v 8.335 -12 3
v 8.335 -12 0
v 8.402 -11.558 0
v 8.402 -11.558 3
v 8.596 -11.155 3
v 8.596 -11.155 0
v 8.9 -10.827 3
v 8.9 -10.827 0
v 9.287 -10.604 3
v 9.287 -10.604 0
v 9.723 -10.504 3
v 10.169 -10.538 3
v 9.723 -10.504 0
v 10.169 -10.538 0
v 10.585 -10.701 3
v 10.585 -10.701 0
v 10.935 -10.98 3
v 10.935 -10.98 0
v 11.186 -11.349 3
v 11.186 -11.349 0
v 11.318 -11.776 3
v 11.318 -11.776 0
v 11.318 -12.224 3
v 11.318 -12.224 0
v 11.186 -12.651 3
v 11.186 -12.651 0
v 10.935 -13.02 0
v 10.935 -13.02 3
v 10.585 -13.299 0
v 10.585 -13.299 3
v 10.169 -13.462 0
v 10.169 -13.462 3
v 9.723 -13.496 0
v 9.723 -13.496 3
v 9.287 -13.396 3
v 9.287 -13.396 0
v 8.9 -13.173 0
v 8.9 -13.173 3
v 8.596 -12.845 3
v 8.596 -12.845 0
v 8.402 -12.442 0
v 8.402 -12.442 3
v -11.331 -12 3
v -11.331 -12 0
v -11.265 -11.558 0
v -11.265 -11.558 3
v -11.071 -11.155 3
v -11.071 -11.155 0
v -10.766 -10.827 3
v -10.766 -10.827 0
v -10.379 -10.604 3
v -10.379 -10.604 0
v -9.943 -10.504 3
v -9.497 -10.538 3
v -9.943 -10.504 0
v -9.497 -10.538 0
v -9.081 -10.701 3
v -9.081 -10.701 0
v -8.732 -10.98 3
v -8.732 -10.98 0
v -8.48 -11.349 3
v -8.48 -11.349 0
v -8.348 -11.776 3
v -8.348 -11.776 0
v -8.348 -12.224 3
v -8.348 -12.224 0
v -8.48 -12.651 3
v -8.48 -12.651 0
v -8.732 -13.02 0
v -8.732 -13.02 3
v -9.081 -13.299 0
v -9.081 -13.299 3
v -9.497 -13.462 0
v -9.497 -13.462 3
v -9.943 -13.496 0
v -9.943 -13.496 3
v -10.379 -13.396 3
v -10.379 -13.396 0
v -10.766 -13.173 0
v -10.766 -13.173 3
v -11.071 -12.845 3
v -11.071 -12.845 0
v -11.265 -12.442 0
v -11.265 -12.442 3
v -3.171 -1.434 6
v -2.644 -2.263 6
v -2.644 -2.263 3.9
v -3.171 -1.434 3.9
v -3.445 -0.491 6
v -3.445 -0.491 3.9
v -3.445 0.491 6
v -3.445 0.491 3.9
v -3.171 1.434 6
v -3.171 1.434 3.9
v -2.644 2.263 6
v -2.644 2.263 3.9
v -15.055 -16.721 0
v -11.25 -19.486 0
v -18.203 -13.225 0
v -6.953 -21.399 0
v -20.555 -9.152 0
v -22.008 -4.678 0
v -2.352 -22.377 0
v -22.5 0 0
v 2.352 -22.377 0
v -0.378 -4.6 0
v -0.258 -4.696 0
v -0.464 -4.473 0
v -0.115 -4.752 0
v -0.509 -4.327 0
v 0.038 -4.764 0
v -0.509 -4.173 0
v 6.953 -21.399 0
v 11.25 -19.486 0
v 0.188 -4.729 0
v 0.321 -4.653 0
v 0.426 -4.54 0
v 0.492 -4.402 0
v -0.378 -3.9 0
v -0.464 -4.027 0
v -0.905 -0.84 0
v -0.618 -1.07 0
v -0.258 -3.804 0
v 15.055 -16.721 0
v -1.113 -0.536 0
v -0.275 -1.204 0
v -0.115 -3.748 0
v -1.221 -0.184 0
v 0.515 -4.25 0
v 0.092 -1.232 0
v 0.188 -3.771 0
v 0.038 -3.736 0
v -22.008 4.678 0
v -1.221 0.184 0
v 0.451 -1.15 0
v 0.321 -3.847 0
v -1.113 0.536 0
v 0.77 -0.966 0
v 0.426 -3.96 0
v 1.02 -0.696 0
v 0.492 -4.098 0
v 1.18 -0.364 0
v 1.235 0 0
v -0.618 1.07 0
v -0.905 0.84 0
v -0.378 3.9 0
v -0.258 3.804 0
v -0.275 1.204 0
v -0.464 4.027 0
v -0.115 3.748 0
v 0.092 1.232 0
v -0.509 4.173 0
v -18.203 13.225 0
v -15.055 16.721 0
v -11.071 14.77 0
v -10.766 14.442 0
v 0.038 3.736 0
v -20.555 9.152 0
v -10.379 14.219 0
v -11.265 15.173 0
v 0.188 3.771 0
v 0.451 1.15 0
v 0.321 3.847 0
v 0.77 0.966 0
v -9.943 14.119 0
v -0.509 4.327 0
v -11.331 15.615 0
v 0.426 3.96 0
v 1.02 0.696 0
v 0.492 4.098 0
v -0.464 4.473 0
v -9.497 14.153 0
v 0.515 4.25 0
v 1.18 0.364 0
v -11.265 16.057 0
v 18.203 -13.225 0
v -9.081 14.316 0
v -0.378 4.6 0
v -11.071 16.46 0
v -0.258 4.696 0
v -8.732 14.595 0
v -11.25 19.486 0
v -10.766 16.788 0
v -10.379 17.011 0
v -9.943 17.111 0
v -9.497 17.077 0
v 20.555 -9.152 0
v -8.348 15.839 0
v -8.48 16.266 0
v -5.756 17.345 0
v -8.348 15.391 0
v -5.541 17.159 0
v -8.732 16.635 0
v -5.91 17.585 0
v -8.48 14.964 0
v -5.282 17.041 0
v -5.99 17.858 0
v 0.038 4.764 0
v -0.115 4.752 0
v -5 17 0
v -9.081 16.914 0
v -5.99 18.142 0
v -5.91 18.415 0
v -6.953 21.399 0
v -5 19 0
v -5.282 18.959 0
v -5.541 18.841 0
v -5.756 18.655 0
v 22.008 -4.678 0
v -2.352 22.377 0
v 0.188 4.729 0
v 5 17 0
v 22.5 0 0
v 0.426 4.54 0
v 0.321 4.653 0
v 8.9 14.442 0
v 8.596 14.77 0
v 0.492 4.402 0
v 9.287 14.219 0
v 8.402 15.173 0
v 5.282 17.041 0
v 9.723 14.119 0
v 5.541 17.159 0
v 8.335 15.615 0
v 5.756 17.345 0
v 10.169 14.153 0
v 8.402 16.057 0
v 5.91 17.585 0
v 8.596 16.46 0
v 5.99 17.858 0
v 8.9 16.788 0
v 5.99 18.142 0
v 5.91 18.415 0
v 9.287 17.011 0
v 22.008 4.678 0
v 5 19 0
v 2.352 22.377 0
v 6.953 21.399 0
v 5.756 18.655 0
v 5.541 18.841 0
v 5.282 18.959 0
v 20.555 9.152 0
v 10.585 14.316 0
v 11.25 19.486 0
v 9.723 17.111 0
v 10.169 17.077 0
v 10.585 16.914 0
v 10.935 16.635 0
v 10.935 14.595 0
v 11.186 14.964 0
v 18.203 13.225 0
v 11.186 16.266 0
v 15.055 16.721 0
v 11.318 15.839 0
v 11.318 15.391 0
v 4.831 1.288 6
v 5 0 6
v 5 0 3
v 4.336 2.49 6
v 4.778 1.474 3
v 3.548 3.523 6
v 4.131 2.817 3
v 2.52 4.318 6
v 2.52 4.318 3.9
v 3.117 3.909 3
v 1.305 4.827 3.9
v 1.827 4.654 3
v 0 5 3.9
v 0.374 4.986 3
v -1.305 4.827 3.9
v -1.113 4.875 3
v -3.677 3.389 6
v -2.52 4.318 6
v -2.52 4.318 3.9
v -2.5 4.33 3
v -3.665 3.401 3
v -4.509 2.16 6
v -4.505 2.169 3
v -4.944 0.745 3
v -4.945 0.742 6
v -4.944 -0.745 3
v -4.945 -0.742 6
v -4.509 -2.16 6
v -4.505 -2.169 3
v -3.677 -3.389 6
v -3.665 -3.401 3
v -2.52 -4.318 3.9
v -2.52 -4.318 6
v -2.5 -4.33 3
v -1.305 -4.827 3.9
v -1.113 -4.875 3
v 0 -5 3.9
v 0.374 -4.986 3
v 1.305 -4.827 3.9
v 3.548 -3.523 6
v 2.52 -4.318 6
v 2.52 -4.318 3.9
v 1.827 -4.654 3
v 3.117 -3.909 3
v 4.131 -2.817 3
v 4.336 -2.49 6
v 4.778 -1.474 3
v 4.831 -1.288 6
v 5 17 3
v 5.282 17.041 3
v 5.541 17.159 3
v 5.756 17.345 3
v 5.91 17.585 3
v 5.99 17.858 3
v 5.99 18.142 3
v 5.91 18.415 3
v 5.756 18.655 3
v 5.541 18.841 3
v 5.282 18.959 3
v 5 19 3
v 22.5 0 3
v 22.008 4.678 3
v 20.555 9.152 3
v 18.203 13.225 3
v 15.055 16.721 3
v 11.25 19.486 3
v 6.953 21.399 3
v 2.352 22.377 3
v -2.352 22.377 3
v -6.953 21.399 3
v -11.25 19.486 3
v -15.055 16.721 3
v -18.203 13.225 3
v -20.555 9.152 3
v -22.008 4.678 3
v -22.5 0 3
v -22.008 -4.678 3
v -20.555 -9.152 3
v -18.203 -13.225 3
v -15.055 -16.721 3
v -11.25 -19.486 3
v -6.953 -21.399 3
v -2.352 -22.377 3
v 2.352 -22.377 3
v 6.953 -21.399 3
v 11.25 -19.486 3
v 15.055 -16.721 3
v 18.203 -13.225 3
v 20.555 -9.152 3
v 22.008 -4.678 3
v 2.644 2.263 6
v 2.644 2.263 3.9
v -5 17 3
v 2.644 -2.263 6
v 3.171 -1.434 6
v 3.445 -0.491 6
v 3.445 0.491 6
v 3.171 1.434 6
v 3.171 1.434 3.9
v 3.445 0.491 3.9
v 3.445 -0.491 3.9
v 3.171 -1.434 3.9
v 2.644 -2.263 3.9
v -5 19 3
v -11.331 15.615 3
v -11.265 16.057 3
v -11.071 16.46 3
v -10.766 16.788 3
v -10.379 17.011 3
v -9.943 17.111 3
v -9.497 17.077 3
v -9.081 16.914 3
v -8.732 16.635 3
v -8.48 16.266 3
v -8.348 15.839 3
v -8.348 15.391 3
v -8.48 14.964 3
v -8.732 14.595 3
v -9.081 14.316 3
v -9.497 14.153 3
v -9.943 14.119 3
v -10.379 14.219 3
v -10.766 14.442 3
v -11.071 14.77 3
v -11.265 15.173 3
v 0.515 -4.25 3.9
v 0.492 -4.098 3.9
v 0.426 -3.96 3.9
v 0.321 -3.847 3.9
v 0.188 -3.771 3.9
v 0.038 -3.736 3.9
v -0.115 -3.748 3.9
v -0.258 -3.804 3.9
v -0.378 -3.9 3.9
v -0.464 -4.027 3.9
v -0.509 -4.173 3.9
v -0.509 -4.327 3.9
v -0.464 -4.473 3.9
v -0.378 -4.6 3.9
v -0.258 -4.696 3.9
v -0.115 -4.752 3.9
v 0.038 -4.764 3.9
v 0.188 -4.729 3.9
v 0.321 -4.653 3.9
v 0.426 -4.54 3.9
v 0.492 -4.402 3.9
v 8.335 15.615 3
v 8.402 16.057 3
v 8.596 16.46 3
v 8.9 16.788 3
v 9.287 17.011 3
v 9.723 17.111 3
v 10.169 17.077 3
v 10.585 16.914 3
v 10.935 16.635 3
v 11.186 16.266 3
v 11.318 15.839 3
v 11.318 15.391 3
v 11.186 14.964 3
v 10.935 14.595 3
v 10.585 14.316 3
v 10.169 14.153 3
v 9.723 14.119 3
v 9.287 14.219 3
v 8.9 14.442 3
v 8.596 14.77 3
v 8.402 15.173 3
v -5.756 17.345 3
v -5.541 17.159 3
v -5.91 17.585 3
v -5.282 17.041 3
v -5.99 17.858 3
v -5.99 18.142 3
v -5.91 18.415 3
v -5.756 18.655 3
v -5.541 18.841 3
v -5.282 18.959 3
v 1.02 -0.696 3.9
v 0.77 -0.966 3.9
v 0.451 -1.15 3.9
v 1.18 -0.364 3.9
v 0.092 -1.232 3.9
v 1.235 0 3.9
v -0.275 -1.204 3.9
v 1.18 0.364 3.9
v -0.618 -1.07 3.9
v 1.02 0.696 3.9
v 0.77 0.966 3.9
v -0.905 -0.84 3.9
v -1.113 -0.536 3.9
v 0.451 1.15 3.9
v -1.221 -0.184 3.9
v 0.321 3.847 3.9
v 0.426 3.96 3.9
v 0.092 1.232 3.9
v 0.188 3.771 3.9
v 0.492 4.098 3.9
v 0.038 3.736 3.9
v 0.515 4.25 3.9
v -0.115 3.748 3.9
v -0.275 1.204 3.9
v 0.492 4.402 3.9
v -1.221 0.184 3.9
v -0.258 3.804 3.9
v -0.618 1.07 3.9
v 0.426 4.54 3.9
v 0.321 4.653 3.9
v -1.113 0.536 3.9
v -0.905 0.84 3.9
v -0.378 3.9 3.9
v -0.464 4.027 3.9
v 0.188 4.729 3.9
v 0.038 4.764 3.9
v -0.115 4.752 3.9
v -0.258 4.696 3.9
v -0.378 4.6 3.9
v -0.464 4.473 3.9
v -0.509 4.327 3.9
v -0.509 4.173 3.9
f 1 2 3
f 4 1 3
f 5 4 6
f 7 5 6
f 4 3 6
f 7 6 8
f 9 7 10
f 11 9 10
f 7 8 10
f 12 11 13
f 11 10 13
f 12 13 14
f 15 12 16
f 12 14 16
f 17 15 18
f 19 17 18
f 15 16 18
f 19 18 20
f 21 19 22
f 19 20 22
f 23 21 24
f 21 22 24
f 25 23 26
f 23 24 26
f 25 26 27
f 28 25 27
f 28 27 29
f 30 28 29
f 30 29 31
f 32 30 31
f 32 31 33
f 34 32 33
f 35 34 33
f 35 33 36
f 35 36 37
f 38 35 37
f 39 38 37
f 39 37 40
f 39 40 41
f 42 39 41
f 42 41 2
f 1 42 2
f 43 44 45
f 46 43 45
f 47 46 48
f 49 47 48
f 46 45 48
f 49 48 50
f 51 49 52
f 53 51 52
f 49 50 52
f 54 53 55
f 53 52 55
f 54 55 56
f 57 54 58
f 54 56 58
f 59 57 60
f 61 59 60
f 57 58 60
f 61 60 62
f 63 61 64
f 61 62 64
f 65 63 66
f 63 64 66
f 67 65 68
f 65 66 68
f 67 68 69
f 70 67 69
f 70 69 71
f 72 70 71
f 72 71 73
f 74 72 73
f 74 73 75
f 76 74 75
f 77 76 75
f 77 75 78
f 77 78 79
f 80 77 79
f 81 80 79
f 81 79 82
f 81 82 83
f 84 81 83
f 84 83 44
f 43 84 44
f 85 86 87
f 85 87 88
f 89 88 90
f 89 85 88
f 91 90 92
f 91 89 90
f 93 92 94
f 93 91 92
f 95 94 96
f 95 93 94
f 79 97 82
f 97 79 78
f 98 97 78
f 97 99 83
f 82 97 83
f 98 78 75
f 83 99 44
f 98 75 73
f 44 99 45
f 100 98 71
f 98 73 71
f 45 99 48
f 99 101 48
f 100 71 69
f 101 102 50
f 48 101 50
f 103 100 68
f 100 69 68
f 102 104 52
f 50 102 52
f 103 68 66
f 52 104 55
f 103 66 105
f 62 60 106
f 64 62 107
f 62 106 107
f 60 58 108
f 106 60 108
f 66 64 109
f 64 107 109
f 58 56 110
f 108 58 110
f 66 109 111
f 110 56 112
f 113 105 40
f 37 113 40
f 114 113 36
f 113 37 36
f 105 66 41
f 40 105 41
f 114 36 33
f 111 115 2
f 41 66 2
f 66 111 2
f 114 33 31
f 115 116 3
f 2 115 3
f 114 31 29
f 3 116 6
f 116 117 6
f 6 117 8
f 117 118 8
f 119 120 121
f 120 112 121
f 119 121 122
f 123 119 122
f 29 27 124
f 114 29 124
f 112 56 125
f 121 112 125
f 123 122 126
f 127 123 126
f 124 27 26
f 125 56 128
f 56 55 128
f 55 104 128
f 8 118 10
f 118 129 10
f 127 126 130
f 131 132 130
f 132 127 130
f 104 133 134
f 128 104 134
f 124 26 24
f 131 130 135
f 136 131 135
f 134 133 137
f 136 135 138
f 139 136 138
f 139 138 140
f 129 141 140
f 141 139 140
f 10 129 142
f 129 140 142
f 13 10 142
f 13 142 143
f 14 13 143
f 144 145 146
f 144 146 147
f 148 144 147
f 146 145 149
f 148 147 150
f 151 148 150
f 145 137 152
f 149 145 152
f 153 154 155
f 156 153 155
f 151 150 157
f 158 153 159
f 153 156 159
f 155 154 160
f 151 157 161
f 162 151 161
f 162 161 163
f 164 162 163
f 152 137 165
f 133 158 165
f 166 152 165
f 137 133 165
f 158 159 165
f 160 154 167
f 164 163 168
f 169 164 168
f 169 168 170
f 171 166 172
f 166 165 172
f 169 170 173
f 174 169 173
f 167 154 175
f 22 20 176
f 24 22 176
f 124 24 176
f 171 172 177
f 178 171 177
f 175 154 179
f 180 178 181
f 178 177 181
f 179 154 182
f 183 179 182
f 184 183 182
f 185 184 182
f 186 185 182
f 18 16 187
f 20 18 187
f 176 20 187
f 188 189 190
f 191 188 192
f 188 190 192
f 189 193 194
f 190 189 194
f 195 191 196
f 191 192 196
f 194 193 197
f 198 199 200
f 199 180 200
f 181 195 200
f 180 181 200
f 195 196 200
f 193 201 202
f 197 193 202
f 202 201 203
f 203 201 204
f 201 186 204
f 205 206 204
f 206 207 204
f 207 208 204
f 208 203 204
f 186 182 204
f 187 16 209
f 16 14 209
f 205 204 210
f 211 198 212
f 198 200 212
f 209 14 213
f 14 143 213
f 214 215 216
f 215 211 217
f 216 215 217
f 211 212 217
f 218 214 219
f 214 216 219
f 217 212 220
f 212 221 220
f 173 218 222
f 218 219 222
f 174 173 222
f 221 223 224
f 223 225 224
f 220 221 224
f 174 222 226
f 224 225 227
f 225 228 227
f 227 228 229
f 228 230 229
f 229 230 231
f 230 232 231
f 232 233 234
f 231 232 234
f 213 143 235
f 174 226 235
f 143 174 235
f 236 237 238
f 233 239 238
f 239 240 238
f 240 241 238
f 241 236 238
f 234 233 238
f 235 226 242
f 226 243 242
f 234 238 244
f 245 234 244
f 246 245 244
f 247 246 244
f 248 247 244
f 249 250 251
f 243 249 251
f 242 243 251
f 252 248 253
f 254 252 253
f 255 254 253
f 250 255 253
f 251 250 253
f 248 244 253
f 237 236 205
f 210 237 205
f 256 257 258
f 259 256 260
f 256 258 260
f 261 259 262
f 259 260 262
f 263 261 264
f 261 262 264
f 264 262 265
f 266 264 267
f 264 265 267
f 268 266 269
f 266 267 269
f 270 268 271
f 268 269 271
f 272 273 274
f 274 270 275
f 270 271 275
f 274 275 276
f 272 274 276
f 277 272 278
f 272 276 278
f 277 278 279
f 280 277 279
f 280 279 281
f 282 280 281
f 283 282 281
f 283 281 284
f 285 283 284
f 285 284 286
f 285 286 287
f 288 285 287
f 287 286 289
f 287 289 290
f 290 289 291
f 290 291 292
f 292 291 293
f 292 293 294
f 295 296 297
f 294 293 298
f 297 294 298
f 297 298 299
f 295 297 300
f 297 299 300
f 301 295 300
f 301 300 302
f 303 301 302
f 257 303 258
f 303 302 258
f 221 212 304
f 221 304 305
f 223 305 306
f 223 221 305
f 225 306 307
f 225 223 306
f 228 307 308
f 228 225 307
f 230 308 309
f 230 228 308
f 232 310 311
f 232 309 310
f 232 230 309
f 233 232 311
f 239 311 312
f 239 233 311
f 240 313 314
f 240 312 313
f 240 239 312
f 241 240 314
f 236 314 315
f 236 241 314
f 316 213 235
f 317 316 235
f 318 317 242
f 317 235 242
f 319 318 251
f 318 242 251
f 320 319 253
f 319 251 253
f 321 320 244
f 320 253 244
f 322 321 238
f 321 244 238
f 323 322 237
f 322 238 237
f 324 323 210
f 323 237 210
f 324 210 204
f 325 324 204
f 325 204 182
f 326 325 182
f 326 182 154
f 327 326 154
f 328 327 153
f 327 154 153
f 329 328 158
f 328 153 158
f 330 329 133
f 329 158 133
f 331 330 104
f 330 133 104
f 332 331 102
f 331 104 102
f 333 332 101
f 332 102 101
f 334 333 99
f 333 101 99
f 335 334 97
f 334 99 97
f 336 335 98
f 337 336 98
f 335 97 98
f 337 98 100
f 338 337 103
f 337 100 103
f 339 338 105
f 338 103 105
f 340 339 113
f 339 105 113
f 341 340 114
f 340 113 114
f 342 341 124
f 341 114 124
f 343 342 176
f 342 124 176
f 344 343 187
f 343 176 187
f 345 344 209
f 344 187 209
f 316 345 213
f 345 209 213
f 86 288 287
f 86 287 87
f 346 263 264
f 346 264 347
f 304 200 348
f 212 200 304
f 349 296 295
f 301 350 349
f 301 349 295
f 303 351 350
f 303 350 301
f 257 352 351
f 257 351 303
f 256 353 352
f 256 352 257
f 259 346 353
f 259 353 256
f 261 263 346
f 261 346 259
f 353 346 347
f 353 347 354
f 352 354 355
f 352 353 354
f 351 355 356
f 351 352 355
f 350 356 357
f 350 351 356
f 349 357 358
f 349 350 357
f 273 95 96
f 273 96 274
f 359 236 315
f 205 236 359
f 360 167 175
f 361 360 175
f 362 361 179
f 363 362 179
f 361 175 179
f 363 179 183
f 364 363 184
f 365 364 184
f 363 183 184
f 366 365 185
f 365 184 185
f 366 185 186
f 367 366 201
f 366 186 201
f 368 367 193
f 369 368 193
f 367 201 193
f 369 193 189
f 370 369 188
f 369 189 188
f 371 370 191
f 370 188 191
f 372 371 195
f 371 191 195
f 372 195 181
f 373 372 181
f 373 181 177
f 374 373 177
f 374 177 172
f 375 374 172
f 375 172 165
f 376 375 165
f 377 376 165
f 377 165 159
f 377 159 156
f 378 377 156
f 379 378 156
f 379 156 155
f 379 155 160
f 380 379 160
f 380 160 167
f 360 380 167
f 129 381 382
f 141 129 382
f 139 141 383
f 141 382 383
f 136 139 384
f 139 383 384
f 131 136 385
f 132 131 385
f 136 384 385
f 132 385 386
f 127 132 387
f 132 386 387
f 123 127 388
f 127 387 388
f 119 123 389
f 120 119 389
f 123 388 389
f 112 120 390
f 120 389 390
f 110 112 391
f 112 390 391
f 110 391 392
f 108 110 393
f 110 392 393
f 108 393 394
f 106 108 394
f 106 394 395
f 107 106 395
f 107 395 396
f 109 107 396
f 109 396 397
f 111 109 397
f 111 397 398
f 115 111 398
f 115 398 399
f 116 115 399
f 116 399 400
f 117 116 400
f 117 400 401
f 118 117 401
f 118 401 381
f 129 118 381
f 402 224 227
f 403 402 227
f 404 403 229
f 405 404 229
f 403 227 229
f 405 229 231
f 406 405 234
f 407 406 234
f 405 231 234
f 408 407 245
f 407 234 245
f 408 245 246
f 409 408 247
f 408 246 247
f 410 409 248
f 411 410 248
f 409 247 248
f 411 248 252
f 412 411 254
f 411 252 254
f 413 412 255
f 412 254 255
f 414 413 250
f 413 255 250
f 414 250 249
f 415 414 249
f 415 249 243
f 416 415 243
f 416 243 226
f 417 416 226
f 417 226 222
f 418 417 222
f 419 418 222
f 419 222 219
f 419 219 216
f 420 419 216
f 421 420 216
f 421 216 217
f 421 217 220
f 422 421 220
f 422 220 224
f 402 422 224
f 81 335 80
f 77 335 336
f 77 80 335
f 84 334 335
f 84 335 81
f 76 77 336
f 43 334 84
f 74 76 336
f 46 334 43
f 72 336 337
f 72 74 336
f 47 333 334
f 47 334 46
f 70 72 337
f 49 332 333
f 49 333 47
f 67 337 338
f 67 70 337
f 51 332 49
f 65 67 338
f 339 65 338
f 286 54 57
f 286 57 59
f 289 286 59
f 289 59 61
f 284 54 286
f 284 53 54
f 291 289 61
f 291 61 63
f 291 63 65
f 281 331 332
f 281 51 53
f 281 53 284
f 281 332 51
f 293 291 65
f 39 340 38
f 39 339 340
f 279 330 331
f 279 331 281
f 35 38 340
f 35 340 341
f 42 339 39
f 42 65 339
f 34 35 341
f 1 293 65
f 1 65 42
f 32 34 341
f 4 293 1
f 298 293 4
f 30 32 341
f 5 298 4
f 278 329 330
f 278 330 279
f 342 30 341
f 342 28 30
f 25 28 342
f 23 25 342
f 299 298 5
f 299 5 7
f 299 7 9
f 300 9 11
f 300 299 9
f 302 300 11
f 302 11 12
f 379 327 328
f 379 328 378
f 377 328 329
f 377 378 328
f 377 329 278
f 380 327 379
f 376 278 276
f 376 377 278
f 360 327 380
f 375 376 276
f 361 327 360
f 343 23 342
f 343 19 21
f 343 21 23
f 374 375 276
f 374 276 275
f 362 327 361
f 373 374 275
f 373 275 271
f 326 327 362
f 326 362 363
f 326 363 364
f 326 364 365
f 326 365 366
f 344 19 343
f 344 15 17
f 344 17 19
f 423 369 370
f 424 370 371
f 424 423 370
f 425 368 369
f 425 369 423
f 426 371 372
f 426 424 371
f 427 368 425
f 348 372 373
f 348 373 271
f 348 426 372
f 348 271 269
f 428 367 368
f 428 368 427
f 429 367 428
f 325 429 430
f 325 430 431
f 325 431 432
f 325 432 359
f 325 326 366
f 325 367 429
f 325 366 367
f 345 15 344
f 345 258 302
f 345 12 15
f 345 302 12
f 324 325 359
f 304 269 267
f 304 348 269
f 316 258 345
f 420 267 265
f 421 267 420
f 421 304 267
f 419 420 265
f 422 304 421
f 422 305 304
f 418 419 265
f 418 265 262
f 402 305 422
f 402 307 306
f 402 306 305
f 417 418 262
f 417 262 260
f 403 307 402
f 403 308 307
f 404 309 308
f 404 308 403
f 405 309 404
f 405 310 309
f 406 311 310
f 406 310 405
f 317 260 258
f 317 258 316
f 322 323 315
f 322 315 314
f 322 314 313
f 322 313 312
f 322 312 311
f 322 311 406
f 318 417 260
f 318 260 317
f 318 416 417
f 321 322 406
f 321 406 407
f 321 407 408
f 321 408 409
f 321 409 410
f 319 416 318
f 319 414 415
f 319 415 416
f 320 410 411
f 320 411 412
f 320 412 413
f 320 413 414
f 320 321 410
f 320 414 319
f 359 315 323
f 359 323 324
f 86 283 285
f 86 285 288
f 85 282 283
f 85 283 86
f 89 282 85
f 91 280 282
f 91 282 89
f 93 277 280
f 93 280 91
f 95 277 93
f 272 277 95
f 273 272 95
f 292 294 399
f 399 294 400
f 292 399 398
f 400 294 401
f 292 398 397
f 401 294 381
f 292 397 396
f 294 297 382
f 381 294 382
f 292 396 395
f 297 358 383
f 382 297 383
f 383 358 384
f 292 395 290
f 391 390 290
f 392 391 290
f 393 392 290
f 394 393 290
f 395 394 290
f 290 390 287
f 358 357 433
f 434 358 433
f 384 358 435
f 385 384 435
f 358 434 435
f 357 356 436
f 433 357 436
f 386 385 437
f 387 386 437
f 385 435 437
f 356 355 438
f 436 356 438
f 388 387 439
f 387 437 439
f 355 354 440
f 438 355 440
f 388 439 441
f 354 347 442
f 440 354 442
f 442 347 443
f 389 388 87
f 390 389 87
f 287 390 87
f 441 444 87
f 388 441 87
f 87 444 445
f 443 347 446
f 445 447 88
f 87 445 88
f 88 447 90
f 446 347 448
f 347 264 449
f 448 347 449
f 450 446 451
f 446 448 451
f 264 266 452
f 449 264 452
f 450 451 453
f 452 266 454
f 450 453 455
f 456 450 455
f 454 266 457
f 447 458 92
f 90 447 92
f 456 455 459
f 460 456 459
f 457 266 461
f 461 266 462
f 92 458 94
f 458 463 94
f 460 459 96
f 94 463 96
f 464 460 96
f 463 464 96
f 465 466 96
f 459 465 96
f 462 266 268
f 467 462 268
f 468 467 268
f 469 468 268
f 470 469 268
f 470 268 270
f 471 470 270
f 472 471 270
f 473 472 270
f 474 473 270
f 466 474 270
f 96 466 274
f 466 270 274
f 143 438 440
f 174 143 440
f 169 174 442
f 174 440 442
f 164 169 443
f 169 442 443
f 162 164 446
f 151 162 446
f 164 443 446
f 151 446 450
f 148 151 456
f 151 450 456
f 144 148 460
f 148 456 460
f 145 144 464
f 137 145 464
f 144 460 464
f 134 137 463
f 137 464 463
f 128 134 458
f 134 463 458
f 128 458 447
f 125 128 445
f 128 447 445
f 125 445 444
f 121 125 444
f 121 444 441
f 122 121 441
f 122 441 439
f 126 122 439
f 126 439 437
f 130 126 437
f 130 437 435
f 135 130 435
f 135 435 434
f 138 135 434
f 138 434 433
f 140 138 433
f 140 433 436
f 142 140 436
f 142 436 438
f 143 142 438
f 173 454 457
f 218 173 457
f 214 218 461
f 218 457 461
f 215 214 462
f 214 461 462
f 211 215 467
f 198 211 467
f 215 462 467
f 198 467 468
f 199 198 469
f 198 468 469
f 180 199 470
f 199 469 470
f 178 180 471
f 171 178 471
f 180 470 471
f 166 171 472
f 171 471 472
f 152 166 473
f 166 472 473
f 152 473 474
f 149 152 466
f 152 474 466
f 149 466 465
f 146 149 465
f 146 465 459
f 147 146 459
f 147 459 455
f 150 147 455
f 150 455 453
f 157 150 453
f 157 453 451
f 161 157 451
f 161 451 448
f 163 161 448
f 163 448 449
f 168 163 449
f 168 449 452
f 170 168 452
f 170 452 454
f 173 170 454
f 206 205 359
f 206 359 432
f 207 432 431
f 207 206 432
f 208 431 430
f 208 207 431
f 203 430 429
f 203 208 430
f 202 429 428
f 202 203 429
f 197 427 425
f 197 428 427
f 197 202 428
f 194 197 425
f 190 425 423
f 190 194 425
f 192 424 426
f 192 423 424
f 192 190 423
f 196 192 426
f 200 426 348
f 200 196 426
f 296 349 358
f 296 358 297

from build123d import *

# Parameters (mm, degrees)
ESQUISSE1_R             = 22.5
BOSS_EXTRU_1_DEPTH      = 3
ESQUISSE2_R             = 5
BOSS_EXTRU_2_DEPTH      = 3
ENL_V_MAT_EXTRU_3_DEPTH = 10
ESQUISSE10_R            = 1.5
ENL_V_MAT_EXTRU_4_DEPTH = 10
ENL_V_MAT_EXTRU_5_DEPTH = 2.1
ESQUISSE12_R            = 0.515
ESQUISSE12_R_2          = 1.235
ENL_V_MAT_EXTRU_6_DEPTH = 33.057916339
ESQUISSE13_R            = 1.5
ENL_V_MAT_EXTRU_7_DEPTH = 33.380549717


with BuildPart() as part:
    # Esquisse1 → Boss.-Extru.1 (new body)
    with BuildSketch(Plane.XY):
        Circle(ESQUISSE1_R)
    extrude(amount=BOSS_EXTRU_1_DEPTH)

    # Esquisse2 → Boss.-Extru.2 (add)
    with BuildSketch(Plane.XY.offset(3)):
        Circle(ESQUISSE2_R)
    extrude(amount=BOSS_EXTRU_2_DEPTH)

    # Esquisse6 → Enlèv. mat.-Extru.3 (cut)
    with BuildSketch(Plane(origin=(0, 0, 0), x_dir=(-1, 0, 0), z_dir=(0, 0, -1))):
        with BuildLine():
            Line((-5, 19), (5, 19))
            ThreePointArc((5, 19), (6, 18), (5, 17))
            Line((5, 17), (-5, 17))
            ThreePointArc((-5, 17), (-6, 18), (-5, 19))
        make_face()
    extrude(amount=-ENL_V_MAT_EXTRU_3_DEPTH, mode=Mode.SUBTRACT)

    # Esquisse10 → Enlèv. mat.-Extru.4 (cut)
    with BuildSketch(Plane(origin=(0, 0, 0), x_dir=(-1, 0, 0), z_dir=(0, 0, -1))):
        with Locations((-9.835, -12)):
            Circle(ESQUISSE10_R)
        with Locations((9.831247904, -12)):
            Circle(ESQUISSE10_R)
    extrude(amount=-ENL_V_MAT_EXTRU_4_DEPTH, mode=Mode.SUBTRACT)

    # Esquisse11 → Enlèv. mat.-Extru.5 (cut)
    with BuildSketch(Plane.XY.offset(6)):
        with BuildLine():
            Line((2.516635816, 4.378246701), (2.643897714, 2.262786971))
            ThreePointArc((2.643897714, 2.262786971), (3.48, 0), (2.643897714, -2.262786971))
            Line((2.643897714, -2.262786971), (2.516635816, -4.378246701))
            ThreePointArc((2.516635816, -4.378246701), (0, -5.05), (-2.516635816, -4.378246701))
            Line((-2.516635816, -4.378246701), (-2.643897714, -2.262786971))
            ThreePointArc((-2.643897714, -2.262786971), (-3.48, 0), (-2.643897714, 2.262786971))
            Line((-2.643897714, 2.262786971), (-2.516635816, 4.378246701))
            ThreePointArc((-2.516635816, 4.378246701), (0, 5.05), (2.516635816, 4.378246701))
        make_face()
    extrude(amount=-ENL_V_MAT_EXTRU_5_DEPTH, mode=Mode.SUBTRACT)

    # Esquisse12 → Enlèv. mat.-Extru.6 (cut, through all)
    with BuildSketch(Plane.XY.offset(3.9)):
        with Locations((0, 4.25)):
            Circle(ESQUISSE12_R)
        Circle(ESQUISSE12_R_2)
        with Locations((0, -4.25)):
            Circle(ESQUISSE12_R)
    extrude(amount=-ENL_V_MAT_EXTRU_6_DEPTH, mode=Mode.SUBTRACT)

    # Esquisse13 → Enlèv. mat.-Extru.7 (cut, through all)
    with BuildSketch(Plane(origin=(0, 0, 0), x_dir=(-1, 0, 0), z_dir=(0, 0, -1))):
        with Locations((-9.835, 15.615)):
            Circle(ESQUISSE13_R)
        with Locations((9.831247904, 15.615)):
            Circle(ESQUISSE13_R)
    extrude(amount=-ENL_V_MAT_EXTRU_7_DEPTH, mode=Mode.SUBTRACT)


solid = part.part
